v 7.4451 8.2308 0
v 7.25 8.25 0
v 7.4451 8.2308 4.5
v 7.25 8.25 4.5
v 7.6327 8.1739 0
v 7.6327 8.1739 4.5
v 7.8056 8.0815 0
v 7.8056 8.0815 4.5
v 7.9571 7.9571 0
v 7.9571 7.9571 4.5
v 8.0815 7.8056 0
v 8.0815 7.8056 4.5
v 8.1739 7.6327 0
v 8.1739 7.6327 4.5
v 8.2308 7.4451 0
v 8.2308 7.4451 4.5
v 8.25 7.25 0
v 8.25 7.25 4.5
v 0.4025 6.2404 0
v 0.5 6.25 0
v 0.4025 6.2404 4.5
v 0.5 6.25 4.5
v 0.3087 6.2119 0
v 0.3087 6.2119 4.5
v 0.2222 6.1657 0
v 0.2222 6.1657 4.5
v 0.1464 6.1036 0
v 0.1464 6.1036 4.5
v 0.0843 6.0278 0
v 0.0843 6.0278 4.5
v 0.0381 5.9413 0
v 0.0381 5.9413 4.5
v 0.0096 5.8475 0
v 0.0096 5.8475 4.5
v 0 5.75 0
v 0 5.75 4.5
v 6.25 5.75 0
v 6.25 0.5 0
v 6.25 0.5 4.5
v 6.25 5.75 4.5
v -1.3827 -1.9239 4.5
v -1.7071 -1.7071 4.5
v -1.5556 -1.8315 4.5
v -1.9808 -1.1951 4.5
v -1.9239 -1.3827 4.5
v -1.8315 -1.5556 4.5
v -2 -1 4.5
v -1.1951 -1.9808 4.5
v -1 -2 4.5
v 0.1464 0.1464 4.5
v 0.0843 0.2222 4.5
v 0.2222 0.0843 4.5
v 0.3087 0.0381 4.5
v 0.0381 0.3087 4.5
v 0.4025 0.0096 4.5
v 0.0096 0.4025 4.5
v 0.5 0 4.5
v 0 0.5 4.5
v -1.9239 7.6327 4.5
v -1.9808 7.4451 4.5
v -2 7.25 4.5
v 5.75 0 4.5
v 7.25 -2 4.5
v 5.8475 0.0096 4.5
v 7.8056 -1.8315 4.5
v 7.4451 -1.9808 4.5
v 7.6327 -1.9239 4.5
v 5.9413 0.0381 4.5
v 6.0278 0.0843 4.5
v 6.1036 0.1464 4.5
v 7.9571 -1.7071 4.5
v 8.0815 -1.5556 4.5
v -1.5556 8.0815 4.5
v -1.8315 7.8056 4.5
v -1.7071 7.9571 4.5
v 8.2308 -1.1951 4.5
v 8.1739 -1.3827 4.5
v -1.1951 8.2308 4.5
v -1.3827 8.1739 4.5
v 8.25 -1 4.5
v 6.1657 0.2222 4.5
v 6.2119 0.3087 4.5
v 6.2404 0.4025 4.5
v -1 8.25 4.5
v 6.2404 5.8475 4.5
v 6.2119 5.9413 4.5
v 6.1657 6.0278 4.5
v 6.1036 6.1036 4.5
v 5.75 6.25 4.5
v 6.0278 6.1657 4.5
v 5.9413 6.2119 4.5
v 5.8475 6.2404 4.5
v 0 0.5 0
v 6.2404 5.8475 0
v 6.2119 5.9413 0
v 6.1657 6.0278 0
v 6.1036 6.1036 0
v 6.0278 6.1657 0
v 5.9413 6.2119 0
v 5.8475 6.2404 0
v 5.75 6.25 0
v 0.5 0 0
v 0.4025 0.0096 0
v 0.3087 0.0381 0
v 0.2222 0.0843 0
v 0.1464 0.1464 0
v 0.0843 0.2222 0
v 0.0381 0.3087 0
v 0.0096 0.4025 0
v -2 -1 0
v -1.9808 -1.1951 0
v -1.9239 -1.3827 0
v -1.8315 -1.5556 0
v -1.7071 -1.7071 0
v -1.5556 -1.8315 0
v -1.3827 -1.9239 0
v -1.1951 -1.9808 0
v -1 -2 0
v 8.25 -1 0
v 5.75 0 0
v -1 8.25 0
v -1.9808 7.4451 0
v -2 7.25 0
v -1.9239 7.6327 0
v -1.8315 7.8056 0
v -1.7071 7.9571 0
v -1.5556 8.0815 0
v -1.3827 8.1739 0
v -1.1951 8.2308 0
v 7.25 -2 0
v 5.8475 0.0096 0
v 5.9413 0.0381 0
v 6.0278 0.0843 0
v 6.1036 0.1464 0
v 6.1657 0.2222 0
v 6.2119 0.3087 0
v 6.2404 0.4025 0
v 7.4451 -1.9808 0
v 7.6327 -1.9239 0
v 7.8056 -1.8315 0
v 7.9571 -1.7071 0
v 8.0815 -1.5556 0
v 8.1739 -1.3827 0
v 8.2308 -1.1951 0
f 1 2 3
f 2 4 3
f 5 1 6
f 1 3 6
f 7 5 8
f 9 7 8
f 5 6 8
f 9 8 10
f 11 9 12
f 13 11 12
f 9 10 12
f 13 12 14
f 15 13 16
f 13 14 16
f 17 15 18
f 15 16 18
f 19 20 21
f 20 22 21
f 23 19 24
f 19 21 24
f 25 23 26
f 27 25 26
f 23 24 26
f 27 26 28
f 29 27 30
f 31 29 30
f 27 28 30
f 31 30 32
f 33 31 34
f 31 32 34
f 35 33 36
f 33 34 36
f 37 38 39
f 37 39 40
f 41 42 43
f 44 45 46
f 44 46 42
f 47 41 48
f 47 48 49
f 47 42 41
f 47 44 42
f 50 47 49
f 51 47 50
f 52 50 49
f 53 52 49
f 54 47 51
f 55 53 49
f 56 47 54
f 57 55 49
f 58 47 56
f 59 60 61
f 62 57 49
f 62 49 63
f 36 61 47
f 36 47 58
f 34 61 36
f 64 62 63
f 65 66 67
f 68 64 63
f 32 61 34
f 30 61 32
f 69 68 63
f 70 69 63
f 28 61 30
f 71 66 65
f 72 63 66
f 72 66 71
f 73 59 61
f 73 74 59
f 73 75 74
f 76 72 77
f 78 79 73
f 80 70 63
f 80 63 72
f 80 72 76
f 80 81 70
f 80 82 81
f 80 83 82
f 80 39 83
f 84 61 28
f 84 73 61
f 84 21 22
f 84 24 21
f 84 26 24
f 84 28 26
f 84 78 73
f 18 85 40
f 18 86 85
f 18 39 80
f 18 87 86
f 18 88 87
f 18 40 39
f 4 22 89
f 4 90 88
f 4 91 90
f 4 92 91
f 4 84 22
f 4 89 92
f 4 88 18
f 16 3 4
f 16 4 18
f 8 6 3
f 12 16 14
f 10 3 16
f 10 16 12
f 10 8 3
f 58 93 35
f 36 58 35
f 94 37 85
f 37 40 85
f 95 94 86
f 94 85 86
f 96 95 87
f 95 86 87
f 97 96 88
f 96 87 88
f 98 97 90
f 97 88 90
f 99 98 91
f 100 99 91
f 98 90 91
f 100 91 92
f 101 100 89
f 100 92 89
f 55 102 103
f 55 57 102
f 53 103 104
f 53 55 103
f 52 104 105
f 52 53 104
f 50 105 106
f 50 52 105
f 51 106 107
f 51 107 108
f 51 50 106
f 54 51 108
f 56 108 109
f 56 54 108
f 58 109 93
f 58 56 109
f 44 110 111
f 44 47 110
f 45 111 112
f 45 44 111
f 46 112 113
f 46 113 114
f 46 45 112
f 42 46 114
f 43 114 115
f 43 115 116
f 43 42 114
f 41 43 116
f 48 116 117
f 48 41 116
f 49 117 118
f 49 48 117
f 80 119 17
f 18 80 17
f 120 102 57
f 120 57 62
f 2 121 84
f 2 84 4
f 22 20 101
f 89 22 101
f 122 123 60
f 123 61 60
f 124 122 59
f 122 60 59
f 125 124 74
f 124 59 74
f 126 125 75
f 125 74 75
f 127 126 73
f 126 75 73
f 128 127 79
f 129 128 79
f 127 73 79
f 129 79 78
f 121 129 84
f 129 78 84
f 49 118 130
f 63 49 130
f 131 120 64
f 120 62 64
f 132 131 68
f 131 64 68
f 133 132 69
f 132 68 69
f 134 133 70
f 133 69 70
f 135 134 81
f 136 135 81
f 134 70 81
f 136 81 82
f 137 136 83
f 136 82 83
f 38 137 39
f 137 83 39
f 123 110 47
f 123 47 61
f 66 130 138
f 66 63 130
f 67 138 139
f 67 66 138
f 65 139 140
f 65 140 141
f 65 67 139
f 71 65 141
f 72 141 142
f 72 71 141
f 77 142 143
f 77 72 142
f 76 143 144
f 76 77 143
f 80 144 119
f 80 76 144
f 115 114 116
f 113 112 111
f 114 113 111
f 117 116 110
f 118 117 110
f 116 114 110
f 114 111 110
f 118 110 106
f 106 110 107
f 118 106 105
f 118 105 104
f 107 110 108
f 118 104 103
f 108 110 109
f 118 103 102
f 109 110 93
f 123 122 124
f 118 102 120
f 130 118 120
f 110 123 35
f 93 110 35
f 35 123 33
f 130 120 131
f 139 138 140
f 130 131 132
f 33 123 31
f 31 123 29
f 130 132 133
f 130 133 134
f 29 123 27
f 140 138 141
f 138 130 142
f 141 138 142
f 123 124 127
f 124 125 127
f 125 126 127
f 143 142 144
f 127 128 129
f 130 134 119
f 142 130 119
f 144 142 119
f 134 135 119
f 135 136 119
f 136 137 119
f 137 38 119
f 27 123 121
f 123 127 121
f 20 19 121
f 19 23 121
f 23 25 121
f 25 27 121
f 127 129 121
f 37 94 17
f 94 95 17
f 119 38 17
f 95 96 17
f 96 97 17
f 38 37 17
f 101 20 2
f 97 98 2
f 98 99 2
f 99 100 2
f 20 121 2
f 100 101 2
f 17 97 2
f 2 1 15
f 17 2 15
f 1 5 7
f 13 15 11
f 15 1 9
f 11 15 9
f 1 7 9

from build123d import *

# Parameters (mm, degrees)
F0_W     = 10.25
F0_H     = 10.25
F0_W_2   = 6.25
F0_H_2   = 6.25
F1_DEPTH = 4.5
F2_R     = 1
F3_R     = 0.5


with BuildPart() as f1:
    # F0 (on Top) → F1 (new body)
    with BuildSketch(Plane.XY):
        with Locations((3.125, 3.125)):
            Rectangle(F0_W, F0_H)
        with Locations((3.125, 3.125)):
            Rectangle(F0_W_2, F0_H_2, mode=Mode.SUBTRACT)
    extrude(amount=F1_DEPTH)

    # F2
    f2_edges = [f1.edges().sort_by_distance(p)[0] for p in [
        (-2, -2, 2.25),
        (8.25, -2, 2.25),
        (8.25, 8.25, 2.25),
        (-2, 8.25, 2.25),
    ]]
    fillet(f2_edges, radius=F2_R)

    # F3
    f3_edges = [f1.edges().sort_by_distance(p)[0] for p in [
        (0, 6.25, 2.25),
        (6.25, 6.25, 2.25),
        (0, 0, 2.25),
        (6.25, 0, 2.25),
    ]]
    fillet(f3_edges, radius=F3_R)


solid = f1.part
